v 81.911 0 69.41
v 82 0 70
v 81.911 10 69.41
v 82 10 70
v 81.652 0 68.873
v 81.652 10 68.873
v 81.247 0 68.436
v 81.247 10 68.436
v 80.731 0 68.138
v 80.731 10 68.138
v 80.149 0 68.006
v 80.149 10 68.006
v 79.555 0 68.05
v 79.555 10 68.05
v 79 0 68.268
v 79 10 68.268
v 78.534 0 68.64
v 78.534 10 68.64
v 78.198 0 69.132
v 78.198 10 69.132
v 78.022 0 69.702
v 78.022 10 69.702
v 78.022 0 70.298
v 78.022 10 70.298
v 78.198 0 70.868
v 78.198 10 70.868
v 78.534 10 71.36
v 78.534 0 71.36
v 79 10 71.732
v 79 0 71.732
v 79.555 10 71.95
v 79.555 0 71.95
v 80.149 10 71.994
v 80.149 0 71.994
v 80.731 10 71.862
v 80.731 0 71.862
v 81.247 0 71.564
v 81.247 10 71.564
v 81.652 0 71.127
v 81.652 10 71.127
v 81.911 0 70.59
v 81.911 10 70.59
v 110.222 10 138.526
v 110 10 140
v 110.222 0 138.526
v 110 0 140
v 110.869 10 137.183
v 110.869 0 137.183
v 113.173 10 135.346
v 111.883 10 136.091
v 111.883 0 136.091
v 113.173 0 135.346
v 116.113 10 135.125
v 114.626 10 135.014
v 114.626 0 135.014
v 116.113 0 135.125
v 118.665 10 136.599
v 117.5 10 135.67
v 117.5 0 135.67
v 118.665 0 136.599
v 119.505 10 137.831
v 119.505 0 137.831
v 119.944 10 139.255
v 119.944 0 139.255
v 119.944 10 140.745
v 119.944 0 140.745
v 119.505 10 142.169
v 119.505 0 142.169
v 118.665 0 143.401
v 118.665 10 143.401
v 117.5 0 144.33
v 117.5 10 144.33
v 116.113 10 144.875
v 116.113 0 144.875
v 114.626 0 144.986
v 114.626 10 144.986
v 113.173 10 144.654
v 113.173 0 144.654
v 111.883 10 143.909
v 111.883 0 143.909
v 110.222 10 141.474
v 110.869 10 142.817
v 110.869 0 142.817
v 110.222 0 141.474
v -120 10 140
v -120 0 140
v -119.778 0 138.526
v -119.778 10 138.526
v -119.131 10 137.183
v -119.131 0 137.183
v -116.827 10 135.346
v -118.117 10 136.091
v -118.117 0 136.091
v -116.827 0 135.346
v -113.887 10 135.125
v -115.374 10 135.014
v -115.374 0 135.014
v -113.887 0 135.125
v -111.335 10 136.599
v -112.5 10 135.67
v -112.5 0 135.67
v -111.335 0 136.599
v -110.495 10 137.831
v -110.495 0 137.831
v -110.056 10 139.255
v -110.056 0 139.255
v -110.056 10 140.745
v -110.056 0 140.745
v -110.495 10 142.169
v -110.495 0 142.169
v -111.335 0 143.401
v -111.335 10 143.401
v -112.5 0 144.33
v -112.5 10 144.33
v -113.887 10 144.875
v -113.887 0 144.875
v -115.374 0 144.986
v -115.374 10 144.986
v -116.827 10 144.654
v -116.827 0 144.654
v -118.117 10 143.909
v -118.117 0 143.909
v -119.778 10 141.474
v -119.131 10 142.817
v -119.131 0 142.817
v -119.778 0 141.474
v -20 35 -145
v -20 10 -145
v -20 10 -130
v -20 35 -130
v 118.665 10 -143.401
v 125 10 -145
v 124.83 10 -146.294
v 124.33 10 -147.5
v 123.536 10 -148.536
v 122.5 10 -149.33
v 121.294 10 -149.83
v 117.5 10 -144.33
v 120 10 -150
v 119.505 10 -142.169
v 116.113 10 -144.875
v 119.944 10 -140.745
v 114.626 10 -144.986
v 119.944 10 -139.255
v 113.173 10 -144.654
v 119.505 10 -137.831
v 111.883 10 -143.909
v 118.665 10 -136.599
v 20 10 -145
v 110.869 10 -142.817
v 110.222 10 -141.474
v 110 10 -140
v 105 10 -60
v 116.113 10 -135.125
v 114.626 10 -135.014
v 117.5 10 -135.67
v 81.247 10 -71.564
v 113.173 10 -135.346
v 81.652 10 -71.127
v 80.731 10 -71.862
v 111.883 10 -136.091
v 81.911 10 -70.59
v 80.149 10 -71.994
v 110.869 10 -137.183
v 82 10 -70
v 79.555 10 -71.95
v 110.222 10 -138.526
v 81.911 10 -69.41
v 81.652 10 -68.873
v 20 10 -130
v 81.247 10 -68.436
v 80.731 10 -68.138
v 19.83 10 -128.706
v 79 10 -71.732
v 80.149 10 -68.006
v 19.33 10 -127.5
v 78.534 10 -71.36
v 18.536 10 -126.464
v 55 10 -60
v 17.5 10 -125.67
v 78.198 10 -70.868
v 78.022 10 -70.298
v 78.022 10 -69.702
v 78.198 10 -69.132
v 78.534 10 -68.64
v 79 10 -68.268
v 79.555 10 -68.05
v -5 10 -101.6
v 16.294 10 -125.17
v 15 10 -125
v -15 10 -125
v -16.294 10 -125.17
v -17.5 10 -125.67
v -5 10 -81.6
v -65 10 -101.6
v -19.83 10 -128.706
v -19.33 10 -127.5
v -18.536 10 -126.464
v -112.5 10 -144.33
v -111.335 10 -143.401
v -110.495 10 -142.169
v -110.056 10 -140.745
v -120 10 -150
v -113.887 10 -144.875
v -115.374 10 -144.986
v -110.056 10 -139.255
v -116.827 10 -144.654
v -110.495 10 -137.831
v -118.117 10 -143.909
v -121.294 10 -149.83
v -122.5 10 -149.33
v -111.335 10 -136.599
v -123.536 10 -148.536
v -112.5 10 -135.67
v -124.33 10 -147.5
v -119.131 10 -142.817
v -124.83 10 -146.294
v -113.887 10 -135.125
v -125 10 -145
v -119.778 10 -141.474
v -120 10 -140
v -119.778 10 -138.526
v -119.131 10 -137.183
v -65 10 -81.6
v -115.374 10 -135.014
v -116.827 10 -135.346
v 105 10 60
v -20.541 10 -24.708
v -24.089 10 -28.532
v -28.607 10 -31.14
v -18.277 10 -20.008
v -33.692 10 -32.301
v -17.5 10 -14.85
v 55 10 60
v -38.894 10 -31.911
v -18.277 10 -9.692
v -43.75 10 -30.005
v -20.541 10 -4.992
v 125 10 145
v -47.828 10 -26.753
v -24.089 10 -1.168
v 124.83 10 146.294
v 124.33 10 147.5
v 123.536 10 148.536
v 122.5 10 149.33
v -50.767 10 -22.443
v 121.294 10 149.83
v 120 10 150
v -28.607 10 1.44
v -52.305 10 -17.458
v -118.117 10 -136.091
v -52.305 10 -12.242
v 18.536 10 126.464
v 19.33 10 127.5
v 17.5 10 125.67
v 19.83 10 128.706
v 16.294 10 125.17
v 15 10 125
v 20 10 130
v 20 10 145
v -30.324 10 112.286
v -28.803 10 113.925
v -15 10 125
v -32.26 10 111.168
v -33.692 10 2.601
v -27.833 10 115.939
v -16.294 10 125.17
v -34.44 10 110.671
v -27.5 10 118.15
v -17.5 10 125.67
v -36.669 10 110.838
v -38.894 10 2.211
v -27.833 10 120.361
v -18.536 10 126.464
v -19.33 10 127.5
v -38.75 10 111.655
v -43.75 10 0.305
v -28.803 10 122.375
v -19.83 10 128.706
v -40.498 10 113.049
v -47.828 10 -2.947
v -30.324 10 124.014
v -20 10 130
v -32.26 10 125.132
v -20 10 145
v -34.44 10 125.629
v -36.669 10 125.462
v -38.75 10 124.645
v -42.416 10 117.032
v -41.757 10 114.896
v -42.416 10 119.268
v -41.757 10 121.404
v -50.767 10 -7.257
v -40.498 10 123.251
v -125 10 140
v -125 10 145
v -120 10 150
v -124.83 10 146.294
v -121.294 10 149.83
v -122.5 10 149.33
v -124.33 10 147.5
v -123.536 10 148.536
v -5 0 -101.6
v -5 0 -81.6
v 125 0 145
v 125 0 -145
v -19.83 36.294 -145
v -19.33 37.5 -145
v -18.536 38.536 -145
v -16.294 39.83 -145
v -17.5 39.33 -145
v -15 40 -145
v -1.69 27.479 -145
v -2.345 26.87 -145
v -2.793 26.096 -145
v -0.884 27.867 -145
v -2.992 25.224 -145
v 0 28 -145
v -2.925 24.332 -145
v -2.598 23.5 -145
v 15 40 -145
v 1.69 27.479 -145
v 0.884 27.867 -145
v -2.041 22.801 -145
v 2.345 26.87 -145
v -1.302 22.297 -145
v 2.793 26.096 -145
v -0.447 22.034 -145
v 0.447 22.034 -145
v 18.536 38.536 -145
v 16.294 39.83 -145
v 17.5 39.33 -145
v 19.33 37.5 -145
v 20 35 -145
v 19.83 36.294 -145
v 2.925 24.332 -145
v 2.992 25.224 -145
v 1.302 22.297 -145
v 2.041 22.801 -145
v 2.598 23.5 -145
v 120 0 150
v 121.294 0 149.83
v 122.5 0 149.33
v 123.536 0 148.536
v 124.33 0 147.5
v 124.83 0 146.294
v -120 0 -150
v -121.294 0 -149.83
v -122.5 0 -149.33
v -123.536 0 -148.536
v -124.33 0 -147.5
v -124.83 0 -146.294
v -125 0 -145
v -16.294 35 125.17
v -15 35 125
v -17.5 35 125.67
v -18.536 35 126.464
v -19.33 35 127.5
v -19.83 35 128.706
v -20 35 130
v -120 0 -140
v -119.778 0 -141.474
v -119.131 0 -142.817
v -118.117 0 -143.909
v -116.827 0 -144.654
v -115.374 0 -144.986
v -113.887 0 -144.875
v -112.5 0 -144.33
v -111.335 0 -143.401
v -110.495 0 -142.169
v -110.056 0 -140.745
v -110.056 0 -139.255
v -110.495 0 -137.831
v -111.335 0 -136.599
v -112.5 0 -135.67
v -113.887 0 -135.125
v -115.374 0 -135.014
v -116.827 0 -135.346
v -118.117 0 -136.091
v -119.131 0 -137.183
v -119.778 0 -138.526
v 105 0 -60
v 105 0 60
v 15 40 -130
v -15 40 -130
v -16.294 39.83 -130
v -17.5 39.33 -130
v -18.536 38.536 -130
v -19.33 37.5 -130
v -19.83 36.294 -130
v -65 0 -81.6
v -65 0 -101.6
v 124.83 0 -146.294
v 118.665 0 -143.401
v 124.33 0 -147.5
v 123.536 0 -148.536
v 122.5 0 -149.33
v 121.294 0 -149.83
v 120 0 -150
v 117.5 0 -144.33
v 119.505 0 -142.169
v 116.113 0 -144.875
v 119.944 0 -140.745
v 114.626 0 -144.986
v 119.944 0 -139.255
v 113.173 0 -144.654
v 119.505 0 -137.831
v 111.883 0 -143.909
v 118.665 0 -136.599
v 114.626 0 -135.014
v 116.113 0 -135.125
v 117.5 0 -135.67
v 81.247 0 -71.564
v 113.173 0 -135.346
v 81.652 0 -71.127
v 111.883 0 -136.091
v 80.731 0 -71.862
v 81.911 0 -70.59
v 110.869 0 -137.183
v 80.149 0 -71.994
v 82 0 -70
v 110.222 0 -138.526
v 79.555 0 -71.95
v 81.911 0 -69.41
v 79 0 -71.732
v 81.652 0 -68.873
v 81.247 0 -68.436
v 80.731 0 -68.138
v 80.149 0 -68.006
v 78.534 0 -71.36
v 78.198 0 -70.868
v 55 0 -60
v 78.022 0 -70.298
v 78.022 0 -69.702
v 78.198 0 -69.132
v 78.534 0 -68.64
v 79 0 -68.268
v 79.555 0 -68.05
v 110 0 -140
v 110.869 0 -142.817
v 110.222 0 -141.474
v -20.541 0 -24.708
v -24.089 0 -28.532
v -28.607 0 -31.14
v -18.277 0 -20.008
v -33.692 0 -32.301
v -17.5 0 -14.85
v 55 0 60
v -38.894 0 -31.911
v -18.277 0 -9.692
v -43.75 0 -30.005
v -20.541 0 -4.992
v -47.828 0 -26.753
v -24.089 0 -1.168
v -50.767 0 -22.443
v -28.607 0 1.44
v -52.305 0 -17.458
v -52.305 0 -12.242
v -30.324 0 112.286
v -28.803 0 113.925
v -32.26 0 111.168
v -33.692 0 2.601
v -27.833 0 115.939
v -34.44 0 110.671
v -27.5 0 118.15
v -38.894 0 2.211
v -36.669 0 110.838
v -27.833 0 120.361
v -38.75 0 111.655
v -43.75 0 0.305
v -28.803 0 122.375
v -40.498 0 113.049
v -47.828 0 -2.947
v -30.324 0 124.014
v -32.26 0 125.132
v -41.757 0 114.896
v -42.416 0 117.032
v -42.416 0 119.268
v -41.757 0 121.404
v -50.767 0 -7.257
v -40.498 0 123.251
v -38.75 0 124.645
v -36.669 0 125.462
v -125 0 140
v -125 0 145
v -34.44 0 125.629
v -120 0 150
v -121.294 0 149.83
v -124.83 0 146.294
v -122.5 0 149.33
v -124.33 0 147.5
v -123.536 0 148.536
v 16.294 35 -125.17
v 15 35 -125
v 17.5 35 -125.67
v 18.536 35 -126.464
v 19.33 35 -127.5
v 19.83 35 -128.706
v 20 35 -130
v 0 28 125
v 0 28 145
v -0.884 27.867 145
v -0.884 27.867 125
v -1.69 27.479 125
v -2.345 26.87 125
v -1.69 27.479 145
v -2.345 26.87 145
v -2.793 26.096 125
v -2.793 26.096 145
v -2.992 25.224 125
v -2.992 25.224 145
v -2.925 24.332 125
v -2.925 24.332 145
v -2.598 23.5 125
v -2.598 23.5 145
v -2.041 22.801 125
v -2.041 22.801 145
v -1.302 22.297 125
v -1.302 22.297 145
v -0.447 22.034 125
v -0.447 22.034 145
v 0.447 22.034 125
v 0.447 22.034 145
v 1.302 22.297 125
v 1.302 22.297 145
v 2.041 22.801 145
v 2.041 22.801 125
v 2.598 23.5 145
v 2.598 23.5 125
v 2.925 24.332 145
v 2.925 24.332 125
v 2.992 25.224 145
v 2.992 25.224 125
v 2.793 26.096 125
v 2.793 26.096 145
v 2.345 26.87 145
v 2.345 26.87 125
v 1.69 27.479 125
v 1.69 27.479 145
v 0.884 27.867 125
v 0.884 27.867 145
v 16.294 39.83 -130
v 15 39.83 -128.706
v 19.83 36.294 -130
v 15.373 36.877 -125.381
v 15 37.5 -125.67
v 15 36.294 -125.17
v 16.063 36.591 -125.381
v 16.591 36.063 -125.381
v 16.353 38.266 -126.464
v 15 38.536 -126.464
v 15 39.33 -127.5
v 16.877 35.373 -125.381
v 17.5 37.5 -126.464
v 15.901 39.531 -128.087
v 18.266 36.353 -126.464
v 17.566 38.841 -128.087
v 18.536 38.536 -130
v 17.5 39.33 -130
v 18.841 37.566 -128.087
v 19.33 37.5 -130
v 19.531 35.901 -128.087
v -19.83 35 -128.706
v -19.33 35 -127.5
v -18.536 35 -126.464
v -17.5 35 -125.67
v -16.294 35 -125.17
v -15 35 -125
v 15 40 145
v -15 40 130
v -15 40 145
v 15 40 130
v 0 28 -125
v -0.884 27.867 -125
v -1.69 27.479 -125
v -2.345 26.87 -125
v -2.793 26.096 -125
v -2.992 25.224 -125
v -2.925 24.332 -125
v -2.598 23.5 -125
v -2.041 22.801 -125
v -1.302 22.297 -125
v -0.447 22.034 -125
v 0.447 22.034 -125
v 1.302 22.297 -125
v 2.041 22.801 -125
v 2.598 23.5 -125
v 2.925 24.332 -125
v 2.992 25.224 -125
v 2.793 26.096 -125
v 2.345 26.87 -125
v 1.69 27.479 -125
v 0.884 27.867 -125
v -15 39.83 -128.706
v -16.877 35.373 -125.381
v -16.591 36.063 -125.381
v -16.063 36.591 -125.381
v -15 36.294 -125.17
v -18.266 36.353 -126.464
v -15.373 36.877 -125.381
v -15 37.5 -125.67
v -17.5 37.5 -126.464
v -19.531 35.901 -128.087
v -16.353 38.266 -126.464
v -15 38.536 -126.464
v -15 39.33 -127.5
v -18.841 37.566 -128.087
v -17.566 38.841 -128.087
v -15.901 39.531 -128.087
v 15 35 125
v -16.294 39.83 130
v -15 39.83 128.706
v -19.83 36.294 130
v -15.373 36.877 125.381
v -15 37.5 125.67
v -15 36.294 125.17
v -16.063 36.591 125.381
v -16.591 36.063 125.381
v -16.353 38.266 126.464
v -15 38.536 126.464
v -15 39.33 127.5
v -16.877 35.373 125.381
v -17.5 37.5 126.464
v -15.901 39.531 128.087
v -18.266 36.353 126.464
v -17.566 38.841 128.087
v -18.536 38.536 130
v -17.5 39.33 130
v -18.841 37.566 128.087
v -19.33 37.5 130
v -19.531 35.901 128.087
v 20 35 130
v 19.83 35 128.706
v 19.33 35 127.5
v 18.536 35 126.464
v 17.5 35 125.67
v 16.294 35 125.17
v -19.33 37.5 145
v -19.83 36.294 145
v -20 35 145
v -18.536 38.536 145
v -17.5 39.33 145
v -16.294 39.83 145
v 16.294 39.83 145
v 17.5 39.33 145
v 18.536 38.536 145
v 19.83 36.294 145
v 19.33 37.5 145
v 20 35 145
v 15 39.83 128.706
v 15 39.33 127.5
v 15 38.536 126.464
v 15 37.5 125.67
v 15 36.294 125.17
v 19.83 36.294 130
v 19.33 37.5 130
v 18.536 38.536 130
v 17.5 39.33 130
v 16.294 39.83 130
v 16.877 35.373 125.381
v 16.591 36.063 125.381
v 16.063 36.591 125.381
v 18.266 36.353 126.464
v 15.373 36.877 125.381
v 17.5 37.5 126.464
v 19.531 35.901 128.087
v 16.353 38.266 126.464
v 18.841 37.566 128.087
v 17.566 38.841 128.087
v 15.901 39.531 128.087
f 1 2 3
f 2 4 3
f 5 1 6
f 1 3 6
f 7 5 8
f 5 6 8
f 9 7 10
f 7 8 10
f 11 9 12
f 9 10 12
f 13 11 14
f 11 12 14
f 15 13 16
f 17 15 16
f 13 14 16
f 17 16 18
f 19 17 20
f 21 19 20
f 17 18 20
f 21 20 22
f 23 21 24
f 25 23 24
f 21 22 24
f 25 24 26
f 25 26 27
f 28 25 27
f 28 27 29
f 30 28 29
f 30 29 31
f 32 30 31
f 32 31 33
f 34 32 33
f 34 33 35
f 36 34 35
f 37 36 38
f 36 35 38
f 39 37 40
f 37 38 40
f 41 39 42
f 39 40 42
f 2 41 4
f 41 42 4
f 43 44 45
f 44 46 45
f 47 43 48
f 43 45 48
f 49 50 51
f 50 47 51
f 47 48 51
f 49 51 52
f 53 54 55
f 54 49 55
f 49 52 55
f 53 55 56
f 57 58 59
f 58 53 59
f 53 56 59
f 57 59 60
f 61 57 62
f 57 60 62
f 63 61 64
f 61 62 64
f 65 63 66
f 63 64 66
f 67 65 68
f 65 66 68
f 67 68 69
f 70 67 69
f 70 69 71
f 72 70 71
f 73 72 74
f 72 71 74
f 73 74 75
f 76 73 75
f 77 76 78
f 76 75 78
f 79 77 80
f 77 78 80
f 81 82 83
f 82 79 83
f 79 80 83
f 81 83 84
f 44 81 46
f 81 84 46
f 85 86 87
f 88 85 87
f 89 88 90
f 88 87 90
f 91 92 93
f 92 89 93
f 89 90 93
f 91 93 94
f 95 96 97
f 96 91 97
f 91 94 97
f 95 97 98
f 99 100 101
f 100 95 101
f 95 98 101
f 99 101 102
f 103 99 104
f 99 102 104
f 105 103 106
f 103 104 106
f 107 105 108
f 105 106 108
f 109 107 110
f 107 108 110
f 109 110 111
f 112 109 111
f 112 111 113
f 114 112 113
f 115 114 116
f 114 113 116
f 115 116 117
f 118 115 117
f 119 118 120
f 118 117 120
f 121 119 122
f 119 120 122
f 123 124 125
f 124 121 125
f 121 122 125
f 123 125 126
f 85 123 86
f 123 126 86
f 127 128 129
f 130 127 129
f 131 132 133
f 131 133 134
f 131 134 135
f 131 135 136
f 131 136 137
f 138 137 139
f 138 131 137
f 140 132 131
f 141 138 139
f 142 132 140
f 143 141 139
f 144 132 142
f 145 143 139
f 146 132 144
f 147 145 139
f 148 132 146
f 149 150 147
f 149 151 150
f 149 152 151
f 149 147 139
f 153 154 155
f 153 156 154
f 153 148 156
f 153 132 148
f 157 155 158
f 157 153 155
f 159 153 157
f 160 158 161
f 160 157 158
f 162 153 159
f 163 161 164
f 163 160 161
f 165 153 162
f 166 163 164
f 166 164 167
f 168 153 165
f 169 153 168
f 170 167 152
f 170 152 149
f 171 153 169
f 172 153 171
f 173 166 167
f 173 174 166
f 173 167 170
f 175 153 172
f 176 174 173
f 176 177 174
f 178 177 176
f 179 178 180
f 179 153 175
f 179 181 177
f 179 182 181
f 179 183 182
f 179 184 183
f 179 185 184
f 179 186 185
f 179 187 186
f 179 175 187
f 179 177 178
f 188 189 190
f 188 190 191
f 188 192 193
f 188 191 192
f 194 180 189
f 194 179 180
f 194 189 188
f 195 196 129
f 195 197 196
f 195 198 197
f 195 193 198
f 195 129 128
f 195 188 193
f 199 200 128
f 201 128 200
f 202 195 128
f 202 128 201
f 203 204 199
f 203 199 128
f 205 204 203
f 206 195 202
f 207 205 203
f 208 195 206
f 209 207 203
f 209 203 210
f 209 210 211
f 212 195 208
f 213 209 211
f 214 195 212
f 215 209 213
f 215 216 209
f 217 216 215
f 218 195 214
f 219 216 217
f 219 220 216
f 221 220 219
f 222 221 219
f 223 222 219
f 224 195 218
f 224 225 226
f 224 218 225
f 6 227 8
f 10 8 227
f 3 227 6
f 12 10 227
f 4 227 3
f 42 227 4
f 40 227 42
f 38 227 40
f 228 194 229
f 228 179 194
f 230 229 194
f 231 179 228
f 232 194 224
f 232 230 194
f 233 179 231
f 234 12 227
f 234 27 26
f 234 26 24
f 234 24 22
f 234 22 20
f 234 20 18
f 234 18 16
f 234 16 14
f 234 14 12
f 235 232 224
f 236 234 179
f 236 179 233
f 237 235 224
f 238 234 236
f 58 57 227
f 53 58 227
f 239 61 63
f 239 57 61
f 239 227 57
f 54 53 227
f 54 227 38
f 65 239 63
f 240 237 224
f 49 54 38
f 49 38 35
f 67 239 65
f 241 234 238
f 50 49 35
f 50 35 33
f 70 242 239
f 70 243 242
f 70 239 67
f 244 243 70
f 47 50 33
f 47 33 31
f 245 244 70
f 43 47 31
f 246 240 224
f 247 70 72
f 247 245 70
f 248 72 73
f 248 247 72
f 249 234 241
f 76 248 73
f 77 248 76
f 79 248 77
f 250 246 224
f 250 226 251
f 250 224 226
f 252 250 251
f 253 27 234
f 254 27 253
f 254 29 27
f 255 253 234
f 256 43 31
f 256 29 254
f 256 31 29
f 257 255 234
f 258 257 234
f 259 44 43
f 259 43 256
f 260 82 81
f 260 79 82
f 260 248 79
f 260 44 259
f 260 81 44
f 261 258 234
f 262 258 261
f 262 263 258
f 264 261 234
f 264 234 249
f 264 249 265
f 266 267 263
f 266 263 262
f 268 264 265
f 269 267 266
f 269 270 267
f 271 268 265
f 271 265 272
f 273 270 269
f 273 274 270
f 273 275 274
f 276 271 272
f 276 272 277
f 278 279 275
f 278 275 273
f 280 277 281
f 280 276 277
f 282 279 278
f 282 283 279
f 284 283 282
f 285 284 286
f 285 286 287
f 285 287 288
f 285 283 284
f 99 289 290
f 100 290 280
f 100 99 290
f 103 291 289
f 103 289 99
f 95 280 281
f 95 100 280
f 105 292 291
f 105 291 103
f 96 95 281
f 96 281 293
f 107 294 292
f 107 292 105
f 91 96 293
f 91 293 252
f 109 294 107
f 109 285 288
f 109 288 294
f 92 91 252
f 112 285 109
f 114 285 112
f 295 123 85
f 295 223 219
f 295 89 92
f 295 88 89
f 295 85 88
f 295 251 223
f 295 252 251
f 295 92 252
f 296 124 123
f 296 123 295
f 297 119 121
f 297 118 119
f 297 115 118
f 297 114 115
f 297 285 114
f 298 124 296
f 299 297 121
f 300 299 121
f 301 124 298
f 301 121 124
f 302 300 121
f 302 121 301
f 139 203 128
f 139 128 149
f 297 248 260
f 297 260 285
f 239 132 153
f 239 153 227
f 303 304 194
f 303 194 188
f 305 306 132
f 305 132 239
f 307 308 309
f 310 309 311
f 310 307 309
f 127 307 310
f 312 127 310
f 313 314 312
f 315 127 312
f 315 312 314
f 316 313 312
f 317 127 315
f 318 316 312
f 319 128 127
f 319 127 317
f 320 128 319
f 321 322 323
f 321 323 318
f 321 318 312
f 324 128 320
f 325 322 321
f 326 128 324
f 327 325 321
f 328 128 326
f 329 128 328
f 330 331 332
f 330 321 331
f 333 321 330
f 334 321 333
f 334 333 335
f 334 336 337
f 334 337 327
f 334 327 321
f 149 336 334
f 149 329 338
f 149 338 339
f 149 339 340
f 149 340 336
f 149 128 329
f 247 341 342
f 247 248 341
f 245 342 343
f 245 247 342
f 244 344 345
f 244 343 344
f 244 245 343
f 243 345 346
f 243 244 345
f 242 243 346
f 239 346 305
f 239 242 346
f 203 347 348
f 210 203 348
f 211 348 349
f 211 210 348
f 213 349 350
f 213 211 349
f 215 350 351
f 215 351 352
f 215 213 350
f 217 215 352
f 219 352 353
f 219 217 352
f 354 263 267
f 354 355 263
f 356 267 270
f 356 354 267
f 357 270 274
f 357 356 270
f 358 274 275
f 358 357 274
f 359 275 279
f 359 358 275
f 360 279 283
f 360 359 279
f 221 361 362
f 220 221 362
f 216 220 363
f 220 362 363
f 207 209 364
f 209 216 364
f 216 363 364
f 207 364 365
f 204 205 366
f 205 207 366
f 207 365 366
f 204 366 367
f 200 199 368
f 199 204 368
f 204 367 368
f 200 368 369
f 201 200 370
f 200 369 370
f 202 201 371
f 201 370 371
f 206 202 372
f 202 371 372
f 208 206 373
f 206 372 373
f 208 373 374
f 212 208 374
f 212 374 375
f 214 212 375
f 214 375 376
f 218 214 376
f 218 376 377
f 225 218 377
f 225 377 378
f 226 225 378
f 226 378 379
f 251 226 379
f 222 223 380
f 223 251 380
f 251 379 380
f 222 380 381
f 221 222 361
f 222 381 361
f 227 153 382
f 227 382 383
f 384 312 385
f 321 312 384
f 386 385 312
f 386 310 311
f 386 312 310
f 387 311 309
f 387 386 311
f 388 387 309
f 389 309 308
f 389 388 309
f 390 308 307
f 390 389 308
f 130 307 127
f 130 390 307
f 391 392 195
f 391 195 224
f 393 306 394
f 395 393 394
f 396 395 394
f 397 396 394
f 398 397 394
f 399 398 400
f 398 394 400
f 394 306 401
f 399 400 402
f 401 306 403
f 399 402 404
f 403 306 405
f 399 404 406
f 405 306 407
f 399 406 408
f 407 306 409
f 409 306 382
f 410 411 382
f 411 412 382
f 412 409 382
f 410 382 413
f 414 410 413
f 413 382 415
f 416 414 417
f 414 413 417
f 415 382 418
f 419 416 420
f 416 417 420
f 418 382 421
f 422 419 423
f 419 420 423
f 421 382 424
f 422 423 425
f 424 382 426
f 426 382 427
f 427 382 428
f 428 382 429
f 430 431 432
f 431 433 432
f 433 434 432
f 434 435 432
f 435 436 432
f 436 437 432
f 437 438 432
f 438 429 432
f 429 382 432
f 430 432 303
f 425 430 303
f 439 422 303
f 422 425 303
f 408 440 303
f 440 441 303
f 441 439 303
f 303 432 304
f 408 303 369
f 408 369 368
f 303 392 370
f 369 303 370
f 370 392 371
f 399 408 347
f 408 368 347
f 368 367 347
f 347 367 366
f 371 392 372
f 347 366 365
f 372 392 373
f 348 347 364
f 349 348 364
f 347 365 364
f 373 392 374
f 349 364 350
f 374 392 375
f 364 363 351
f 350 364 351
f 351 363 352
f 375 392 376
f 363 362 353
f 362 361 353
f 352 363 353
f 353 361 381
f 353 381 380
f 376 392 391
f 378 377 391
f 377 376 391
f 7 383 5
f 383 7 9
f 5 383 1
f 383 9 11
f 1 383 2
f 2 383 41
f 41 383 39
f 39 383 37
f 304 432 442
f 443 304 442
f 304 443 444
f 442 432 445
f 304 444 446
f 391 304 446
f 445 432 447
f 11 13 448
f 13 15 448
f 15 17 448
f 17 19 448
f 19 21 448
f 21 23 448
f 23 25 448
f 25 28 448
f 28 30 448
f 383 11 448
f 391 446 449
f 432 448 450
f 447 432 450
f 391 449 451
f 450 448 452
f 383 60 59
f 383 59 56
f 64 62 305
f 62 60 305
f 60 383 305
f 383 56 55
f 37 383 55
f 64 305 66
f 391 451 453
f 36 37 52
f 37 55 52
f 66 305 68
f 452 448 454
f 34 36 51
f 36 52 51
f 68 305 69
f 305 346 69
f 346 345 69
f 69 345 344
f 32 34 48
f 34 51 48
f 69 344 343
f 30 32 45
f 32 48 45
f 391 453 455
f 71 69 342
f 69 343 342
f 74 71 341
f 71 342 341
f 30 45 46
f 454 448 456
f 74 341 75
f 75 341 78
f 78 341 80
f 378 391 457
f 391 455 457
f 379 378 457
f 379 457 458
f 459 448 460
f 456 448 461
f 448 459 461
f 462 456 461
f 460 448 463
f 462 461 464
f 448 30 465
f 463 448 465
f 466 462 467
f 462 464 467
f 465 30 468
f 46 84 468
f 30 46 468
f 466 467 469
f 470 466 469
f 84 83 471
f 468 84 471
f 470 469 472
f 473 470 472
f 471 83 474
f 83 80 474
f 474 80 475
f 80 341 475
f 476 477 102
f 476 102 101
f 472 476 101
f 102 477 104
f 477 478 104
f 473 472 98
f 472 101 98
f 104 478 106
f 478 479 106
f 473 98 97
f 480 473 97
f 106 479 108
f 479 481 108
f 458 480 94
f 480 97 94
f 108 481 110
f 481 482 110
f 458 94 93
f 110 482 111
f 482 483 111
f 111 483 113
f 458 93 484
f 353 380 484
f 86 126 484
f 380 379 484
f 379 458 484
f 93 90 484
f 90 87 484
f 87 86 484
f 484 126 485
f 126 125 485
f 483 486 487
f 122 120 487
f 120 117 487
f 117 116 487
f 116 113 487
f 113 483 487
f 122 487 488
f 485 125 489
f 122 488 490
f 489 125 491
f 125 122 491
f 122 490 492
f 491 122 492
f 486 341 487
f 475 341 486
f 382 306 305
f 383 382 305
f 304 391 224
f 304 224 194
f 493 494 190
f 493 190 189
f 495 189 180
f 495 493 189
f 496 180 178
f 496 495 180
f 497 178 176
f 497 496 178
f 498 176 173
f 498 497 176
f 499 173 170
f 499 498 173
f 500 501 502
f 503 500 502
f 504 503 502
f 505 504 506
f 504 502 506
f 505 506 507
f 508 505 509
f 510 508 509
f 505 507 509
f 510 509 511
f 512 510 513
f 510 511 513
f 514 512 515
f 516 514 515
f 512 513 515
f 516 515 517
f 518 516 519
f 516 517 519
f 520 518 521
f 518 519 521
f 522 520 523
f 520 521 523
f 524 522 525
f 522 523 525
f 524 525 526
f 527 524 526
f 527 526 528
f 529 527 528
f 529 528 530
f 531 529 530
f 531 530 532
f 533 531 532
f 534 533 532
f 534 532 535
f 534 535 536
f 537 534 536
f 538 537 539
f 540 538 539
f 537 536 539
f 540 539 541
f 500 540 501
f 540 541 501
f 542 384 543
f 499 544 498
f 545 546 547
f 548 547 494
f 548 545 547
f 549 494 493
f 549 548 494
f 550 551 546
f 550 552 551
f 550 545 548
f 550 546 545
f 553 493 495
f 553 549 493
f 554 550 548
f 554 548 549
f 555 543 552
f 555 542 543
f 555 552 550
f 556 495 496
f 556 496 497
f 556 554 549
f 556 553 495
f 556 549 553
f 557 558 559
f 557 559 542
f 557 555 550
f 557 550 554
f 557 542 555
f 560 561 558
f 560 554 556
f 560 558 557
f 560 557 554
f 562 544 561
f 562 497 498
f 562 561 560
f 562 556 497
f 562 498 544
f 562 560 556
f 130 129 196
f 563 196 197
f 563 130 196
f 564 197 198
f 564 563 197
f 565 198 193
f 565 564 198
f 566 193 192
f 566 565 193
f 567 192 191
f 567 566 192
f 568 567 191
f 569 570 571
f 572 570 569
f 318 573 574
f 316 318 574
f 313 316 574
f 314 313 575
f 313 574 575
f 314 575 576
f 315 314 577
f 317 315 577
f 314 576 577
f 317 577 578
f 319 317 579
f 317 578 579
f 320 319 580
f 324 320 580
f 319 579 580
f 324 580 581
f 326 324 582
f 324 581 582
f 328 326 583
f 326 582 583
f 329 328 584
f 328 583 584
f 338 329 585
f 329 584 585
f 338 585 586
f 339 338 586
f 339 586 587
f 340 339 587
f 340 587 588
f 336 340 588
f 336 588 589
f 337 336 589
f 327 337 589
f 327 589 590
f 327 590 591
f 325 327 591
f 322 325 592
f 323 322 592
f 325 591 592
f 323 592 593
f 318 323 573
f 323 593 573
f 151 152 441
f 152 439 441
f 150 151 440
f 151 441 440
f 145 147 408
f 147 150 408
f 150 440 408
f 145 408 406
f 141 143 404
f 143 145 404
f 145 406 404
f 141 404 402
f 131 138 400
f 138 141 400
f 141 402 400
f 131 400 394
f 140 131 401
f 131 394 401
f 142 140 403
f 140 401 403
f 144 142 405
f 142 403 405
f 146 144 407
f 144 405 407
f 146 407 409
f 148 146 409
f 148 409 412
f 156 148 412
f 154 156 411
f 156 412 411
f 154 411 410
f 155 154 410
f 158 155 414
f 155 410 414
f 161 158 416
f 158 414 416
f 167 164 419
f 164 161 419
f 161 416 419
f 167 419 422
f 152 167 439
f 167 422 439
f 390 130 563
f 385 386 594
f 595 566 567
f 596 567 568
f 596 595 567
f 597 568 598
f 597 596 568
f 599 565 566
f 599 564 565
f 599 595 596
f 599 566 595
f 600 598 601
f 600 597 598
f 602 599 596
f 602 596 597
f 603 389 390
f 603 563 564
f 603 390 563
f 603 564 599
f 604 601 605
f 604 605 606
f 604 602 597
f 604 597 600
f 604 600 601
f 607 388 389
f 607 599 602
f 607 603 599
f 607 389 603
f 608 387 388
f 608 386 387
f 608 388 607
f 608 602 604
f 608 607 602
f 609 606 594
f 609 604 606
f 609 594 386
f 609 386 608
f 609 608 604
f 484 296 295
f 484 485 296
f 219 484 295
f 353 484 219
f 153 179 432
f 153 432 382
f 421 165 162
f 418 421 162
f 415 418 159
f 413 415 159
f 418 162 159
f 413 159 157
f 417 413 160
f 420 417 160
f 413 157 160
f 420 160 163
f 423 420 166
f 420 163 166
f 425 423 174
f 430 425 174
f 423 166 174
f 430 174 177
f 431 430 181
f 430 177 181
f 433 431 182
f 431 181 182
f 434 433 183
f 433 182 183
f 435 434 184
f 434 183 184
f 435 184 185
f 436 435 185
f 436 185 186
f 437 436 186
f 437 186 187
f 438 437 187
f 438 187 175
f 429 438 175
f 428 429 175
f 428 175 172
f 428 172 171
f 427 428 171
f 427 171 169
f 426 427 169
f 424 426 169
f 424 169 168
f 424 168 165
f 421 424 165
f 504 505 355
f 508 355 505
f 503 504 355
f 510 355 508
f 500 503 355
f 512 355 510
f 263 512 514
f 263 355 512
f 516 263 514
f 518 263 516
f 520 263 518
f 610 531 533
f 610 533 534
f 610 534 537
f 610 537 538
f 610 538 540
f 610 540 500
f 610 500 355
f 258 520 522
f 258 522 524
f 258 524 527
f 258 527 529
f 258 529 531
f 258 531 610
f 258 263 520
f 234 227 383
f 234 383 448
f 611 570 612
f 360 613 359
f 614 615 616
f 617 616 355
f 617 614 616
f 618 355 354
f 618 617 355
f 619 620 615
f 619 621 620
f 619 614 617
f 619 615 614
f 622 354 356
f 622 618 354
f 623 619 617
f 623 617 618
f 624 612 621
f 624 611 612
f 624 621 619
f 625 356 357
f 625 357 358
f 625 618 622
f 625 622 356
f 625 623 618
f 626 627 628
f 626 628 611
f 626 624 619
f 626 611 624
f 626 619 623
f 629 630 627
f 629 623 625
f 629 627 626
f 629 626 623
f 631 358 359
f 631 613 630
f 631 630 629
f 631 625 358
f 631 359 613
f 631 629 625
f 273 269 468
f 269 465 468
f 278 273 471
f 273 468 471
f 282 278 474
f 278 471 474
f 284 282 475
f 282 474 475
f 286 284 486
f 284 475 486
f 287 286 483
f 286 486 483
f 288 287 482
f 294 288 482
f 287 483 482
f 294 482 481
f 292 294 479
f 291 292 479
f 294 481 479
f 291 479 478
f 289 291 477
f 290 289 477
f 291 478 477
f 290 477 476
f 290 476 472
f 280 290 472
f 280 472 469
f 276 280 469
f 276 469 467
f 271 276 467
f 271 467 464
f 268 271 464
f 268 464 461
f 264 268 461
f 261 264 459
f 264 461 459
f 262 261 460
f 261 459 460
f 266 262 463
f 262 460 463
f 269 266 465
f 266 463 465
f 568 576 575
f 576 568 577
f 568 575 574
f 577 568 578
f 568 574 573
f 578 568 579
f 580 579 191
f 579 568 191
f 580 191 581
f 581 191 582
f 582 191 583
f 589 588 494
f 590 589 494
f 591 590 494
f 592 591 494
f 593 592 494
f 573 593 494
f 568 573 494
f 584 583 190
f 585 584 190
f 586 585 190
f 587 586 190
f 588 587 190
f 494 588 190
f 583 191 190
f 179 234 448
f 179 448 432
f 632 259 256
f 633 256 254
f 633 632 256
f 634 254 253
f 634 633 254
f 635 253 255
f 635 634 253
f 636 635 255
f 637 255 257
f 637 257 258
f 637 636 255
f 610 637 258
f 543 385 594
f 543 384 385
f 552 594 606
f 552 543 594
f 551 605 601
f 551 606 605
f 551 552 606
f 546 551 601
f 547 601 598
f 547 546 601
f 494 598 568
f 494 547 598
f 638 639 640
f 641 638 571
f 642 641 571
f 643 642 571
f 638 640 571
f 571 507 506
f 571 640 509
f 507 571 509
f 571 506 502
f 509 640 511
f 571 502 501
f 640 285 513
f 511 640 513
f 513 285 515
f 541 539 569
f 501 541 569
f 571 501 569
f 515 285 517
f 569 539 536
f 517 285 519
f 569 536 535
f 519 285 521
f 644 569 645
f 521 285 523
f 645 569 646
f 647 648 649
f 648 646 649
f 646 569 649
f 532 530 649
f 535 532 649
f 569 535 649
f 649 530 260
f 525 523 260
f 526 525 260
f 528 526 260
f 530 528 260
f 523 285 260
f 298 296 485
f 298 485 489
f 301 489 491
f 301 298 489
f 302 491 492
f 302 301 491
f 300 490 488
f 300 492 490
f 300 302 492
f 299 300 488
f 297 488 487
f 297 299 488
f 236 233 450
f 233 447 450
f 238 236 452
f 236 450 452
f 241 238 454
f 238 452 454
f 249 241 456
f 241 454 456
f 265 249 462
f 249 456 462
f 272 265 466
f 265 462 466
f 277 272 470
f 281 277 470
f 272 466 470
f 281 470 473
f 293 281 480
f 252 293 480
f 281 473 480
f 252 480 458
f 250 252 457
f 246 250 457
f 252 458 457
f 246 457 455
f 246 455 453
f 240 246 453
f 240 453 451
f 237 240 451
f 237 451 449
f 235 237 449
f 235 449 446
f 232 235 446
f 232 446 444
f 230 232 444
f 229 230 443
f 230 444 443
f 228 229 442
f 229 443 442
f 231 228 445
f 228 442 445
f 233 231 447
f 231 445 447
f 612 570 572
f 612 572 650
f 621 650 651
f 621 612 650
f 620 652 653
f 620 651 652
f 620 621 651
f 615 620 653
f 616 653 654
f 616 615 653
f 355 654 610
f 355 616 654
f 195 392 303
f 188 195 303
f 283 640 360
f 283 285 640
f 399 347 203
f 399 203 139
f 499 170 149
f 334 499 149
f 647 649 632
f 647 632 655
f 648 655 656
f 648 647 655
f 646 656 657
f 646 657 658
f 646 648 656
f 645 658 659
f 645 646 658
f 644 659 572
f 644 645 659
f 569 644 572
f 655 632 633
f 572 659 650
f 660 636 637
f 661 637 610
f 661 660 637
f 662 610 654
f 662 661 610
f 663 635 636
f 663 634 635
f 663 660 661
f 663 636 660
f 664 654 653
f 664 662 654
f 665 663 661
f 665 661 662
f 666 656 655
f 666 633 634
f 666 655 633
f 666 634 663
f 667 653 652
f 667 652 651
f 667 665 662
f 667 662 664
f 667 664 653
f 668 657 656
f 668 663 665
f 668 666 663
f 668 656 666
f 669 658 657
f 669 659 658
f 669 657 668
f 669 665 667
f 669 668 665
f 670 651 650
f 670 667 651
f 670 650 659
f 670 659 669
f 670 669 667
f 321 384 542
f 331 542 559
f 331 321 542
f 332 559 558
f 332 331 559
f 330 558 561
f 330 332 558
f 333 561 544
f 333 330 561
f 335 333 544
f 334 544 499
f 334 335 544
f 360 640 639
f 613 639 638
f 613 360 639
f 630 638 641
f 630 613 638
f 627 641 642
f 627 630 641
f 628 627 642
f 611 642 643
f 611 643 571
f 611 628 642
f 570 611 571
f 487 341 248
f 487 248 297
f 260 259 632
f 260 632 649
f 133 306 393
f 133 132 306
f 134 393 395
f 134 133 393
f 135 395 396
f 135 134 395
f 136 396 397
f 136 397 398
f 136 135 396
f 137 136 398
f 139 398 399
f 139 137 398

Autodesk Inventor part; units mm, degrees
ref_plane "YZ Plane" through (0, 0, 0) normal (1, 0, 0) x (0, 1, 0)
ref_plane "XZ Plane" through (0, 0, 0) normal (0, 1, 0) x (-1, 0, 0)
ref_plane "XY Plane" through (0, 0, 0) normal (0, 0, 1) x (1, 0, 0)
sketch "Sketch1" plane through (0, 0, 0) normal (0, 1, 0) x (-1, 0, 0)
  line L0 (0, 0) -> (0, 150)
  line L1 (0, 150) -> (125, 150)
  line L2 (125, 150) -> (125, -150)
  line L3 (125, -150) -> (-125, -150)
  line L4 (-125, -150) -> (-125, 150)
  line L5 (-125, 150) -> (0, 150)
  line L6 (125, 150) -> (125, 140)
  line L7 (125, 140) -> (115, 140)
  circle A0 centre (115, 140) radius 5
  line L8 (125, 0) -> (-125, 0)
  line L9 (0, 150) -> (0, -150)
  circle A1 centre (115, -140) radius 5
  circle A2 centre (-115, 140) radius 5
  circle A3 centre (-115, -140) radius 5
  dimension "d0" = 150
  dimension "d1" = 125
  dimension "d2" = 300
  dimension "d3" = 250
  dimension "d4" = 10
  dimension "d5" = 10
  dimension "d6" = 10
extrude "Extrusion1" add sketch "Sketch1" along normal blind 10
fillet "Fillet1" radius 5 4 edges at (-125, 5, 150) (-125, 5, -150) (125, 5, -150) (125, 5, 150)
sketch "Sketch2" plane through (0, 10, 0) normal (0, 1, 0) x (1, 0, 0)
  line L0 (-120, -150) -> (120, -150) projected
  line L1 (-117.475, -150) -> (-117.475, -145)
  line L2 (125, -145) -> (125, 145) projected
  line L3 (-117.475, -145) -> (125, -145)
  line L4 (0, 0) -> (0, -145)
  line L5 (0, -145) -> (-20, -145)
  line L6 (-20, -145) -> (-20, -125)
  line L7 (-20, -125) -> (20, -125)
  line L8 (20, -125) -> (20, -145)
  line L9 (-125, 145) -> (-125, -145) projected
  line L10 (-125, 0) -> (125, 0)
  line L11 (-117.475, 145) -> (125, 145)
  line L12 (-20, 145) -> (-20, 125)
  line L13 (-20, 125) -> (20, 125)
  line L14 (20, 125) -> (20, 145)
  dimension "d10" = 5
  dimension "d11" = 20
  dimension "d12" = 20
  dimension "d13" = 40
extrude "Extrusion2" add sketch "Sketch2" along normal blind 30 contours L14 L13 L12 L11 | L3 L4 L7 L8 | L3 L6 L7 L4
fillet "Fillet2" radius 5 10 edges at (-20, 40, -135) (20, 40, -135) (-20, 40, 135) (20, 40, 135) (20, 25, 125) (20, 25, -125) (-20, 25, -125) (-20, 25, 125) (0, 40, 125) (0, 40, -125)
sketch "Sketch3" plane through (20, 10, -145) normal (0, 0, -1) x (-1, 0, 0)
  line L0 (40, 0) -> (40, 25) projected
  line L1 (40, 0) -> (20, 0)
  line L2 (140, 0) -> (-100, 0) projected
  line L3 (20, 0) -> (20, 15)
  circle A0 centre (20, 15) radius 3
  point P0 (20, -10)
  dimension "d17" = 20
  dimension "d18" = 15
  dimension "d19" = 6
hole "Hole1" at (0, 25, -145) direction (0, 0, 1) diameter 6 end through all
sketch "Sketch4" plane through (0, 10, 0) normal (0, 1, 0) x (1, 0, 0)
  line L0 (125, -145) -> (125, 145) projected
  line L1 (125, 0) -> (105, 0)
  line L2 (105, 0) -> (105, -60)
  line L3 (105, -60) -> (55, -60)
  line L4 (55, -60) -> (55, 60)
  line L5 (55, 60) -> (105, 60)
  line L6 (105, 60) -> (105, 0)
  line L7 (105, 0) -> (80, 0)
  line L8 (80, 0) -> (80, -70)
  circle A0 centre (80, -70) radius 2
  circle A1 centre (80, 70) radius 2
  point P0 (0, 0)
  dimension "d27" = 20
  dimension "d28" = 60
  dimension "d29" = 50
  dimension "d30" = 120
  dimension "d31" = 25
  dimension "d32" = 70
  dimension "d33" = 4
extrude "Extrusion3" cut sketch "Sketch4" against normal blind 30
sketch "Sketch5" plane through (0, 0, 0) normal (0, -1, 0) x (1, 0, 0)
  line L0 (-125, -145) -> (-125, 145) projected
  line L1 (-125, 0) -> (-35, 0)
  line L2 (-35, 0) -> (-35, -120.65)
  line L3 (-35, -120.65) -> (-35, 114.35)
  line L4 (-35, -120.65) -> (-35, -84.15)
  line L5 (-35, -101.6) -> (-65, -101.6)
  line L6 (-65, -101.6) -> (-5, -101.6)
  line L7 (-65, -101.6) -> (-65, -81.6)
  line L8 (-65, -81.6) -> (-5, -81.6)
  line L9 (-5, -81.6) -> (-5, -101.6)
  line L10 (-35, -81.6) -> (-35, -14.85)
  circle A0 centre (-35, -14.85) radius 17.5
  line L11 (-35, 2.6) -> (-35, 118.15)
  circle A1 centre (-35, 118.15) radius 7.5
  point P0 (0, 0)
  dimension "d36" = 90
  dimension "d37" = 235
  dimension "d38" = 36.5
  dimension "d39" = 30
  dimension "d40" = 60
  dimension "d41" = 20
  dimension "d42" = 66.75
  dimension "d43" = 35
  dimension "d44" = 115.55
  dimension "d45" = 15
extrude "Extrusion4" cut sketch "Sketch5" against normal blind 10
properties part number "top"
